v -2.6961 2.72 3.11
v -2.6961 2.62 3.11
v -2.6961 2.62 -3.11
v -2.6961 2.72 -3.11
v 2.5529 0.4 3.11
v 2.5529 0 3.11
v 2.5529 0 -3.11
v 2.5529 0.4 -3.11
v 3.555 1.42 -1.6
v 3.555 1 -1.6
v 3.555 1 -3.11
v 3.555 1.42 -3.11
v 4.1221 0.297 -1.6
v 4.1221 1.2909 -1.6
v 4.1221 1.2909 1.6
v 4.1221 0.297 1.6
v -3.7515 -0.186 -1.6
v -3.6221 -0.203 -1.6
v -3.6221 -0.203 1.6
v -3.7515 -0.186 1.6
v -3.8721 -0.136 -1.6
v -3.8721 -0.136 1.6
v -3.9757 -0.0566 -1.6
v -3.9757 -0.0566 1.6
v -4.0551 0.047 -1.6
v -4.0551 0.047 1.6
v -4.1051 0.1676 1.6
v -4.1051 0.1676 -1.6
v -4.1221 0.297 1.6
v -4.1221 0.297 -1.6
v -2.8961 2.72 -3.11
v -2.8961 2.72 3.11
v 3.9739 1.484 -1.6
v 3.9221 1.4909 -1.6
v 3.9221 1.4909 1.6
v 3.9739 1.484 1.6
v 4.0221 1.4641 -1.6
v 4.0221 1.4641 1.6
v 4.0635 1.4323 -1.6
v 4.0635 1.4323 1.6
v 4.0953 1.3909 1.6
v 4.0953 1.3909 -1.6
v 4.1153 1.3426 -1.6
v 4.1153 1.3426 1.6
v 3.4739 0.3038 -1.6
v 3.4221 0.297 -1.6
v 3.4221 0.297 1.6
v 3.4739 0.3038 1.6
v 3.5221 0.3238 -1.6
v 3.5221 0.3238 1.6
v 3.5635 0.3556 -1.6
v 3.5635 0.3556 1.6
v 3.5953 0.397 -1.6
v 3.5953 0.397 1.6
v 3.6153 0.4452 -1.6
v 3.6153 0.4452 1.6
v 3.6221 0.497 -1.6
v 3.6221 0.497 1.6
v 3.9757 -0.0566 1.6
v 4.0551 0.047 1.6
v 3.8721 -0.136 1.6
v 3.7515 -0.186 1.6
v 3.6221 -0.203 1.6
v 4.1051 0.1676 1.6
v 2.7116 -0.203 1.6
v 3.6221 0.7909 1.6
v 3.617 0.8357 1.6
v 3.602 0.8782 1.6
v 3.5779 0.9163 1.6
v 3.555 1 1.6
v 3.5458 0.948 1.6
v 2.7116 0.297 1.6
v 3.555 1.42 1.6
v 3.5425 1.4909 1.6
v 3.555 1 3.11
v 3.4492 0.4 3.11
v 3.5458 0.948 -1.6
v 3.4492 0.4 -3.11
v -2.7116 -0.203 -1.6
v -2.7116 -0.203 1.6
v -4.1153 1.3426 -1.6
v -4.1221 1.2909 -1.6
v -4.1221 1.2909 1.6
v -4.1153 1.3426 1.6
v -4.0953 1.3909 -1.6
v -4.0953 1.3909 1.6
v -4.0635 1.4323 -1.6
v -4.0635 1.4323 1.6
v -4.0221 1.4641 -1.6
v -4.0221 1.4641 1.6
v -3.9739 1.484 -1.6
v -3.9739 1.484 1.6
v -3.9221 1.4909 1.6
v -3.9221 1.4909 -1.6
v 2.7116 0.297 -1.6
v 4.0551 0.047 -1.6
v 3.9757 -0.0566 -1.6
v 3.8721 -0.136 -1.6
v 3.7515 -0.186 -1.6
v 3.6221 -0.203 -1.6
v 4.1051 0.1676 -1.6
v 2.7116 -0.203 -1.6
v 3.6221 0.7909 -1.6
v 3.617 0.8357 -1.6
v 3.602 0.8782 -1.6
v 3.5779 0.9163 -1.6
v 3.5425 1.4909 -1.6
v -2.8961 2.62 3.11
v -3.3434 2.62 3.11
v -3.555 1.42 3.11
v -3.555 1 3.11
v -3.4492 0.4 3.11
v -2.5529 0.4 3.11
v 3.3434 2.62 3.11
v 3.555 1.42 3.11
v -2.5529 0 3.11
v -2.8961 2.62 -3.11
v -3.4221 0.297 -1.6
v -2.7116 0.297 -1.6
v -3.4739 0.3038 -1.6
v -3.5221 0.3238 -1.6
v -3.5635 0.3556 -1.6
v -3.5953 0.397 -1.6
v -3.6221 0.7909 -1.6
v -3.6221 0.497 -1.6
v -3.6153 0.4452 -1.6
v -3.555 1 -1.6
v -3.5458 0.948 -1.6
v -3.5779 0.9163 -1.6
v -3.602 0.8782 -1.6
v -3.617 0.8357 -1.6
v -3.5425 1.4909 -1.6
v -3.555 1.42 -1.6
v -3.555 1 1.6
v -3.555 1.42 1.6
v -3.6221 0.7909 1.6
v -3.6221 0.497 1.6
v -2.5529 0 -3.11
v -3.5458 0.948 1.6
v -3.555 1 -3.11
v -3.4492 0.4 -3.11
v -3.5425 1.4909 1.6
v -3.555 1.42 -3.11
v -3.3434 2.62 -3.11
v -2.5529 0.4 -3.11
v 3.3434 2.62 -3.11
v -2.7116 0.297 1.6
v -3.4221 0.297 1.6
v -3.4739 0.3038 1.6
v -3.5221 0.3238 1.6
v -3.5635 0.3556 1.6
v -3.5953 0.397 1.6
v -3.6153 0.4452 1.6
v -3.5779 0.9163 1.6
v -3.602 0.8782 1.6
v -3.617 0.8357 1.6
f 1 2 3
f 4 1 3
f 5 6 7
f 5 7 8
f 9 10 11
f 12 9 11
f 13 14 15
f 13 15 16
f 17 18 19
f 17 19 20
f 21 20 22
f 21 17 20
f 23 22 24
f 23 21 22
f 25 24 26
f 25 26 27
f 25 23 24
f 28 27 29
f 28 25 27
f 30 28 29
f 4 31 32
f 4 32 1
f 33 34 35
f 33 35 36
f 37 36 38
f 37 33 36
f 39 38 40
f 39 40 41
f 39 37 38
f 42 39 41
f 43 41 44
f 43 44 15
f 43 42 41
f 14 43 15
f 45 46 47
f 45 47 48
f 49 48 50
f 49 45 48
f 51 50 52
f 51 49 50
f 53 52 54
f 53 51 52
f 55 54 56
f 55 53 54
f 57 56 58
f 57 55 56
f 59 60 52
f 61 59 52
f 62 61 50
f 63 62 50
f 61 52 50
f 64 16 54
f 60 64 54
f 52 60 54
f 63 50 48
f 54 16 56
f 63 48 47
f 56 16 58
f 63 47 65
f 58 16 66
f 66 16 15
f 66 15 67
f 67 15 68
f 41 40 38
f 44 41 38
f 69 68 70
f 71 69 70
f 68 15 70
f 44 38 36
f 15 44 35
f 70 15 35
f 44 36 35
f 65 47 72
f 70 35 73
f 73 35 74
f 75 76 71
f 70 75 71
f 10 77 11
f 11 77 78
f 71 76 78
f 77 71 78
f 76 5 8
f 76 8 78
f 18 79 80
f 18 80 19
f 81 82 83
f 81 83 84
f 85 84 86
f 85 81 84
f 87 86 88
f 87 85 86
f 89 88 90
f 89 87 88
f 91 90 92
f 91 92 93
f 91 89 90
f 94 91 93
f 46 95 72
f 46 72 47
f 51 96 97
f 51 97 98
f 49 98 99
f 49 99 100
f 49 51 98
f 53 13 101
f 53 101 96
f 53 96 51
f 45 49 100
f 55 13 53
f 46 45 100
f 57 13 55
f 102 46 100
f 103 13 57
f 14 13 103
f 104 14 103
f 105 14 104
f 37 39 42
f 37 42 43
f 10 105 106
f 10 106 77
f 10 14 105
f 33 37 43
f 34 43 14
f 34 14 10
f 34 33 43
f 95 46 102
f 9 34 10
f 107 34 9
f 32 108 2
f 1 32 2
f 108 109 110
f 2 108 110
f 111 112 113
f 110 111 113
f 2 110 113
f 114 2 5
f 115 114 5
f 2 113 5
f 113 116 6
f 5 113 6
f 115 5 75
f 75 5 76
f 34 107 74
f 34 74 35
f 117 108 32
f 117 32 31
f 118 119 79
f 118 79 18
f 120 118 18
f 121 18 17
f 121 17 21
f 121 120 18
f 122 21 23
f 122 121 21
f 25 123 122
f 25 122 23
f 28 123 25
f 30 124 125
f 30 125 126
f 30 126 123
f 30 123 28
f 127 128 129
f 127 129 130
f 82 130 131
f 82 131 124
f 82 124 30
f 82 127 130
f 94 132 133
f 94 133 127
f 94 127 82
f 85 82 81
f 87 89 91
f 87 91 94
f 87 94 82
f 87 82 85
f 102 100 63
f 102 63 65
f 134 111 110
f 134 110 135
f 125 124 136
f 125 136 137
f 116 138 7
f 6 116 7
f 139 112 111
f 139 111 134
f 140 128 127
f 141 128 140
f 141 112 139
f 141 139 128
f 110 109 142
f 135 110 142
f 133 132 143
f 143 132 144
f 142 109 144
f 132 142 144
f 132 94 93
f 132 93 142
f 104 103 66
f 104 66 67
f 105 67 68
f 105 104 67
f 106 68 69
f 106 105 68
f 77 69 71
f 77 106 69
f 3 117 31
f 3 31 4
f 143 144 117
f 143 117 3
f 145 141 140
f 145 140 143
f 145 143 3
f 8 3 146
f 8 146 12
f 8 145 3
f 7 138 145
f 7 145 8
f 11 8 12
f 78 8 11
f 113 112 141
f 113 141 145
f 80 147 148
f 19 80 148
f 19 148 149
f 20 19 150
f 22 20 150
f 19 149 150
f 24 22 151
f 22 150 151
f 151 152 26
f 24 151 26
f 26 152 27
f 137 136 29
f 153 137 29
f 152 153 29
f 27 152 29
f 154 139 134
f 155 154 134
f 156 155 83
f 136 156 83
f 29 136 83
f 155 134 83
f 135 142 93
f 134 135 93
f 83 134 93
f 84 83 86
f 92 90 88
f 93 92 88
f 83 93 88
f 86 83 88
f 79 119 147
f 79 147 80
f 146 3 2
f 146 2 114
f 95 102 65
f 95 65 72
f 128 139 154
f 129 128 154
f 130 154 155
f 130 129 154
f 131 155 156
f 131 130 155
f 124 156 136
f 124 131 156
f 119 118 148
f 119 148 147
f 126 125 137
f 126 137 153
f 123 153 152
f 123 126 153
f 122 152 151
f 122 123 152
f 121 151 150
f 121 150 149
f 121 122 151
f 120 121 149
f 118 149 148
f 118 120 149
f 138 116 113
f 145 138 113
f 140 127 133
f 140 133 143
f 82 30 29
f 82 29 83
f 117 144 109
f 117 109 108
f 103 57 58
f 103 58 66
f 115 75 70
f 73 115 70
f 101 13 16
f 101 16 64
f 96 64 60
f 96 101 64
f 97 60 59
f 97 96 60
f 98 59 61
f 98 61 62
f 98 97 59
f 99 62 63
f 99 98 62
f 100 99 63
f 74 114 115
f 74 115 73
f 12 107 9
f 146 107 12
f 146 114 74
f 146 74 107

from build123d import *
from OCP.BRepFilletAPI import BRepFilletAPI_MakeChamfer

# Parameters (mm, degrees)
SKETCH_1_W           = 7.11
SKETCH_1_H           = 6.22
EXTRUDE_1_DEPTH      = 2.62
CHAMFER_1_SIZE       = 1.2
CHAMFER_1_SIZE2      = 0.211592377
CHAMFER_2_SIZE       = 1
CHAMFER_2_SIZE2      = 0.176326981
SKETCH_3_W           = 1.589547356
SKETCH_3_H           = 0.4
CUT_EXTRUDE_1_DEPTH  = 8.628291093
EXTRUDE_2_DEPTH      = 1.6
EXTRUDE_2_DEPTH_BACK = 1.6
SKETCH_4_W           = 0.2
SKETCH_4_H           = 6.22
EXTRUDE_3_DEPTH      = 0.1


with BuildPart() as part:
    # 草图1 → 凸台-拉伸1 (new body)
    with BuildSketch(Plane(origin=(0, 0, 0), x_dir=(1, 0, 0), z_dir=(0, 1, 0))):
        Rectangle(SKETCH_1_W, SKETCH_1_H)
    extrude(amount=EXTRUDE_1_DEPTH)

    # 倒角1: one chamfer whose edges measure the first distance from different faces: ONE call of the kernel's chamfer builder (chamfer() names one face for all edges)
    chamfer_1_edges_1 = [part.edges().sort_by_distance(p)[0] for p in [
        (3.555, 2.62, 0),
    ]]
    chamfer_1_side_1 = [part.faces().sort_by_distance(p)[0] for p in [
        (3.555, 1.31, 0),
    ]]
    chamfer_1_edges_2 = [part.edges().sort_by_distance(p)[0] for p in [
        (-3.555, 2.62, 0),
    ]]
    chamfer_1_side_2 = [part.faces().sort_by_distance(p)[0] for p in [
        (-3.555, 1.31, 0),
    ]]
    chamfer_1 = BRepFilletAPI_MakeChamfer(part.part.solid().wrapped)
    for e in chamfer_1_edges_1:
        chamfer_1.Add(CHAMFER_1_SIZE, CHAMFER_1_SIZE2, e.wrapped, chamfer_1_side_1[0].wrapped)  # the first distance lies on this face
    for e in chamfer_1_edges_2:
        chamfer_1.Add(CHAMFER_1_SIZE, CHAMFER_1_SIZE2, e.wrapped, chamfer_1_side_2[0].wrapped)  # the first distance lies on this face
    add(Compound.cast(chamfer_1.Shape()), mode=Mode.REPLACE)

    # 倒角2: one chamfer whose edges measure the first distance from different faces: ONE call of the kernel's chamfer builder (chamfer() names one face for all edges)
    chamfer_2_edges_1 = [part.edges().sort_by_distance(p)[0] for p in [
        (3.555, 0, 0),
    ]]
    chamfer_2_side_1 = [part.faces().sort_by_distance(p)[0] for p in [
        (3.555, 0.71, 0),
    ]]
    chamfer_2_edges_2 = [part.edges().sort_by_distance(p)[0] for p in [
        (-3.555, 0, 0),
    ]]
    chamfer_2_side_2 = [part.faces().sort_by_distance(p)[0] for p in [
        (-3.555, 0.71, 0),
    ]]
    chamfer_2 = BRepFilletAPI_MakeChamfer(part.part.solid().wrapped)
    for e in chamfer_2_edges_1:
        chamfer_2.Add(CHAMFER_2_SIZE, CHAMFER_2_SIZE2, e.wrapped, chamfer_2_side_1[0].wrapped)  # the first distance lies on this face
    for e in chamfer_2_edges_2:
        chamfer_2.Add(CHAMFER_2_SIZE, CHAMFER_2_SIZE2, e.wrapped, chamfer_2_side_2[0].wrapped)  # the first distance lies on this face
    add(Compound.cast(chamfer_2.Shape()), mode=Mode.REPLACE)

    # 草图3 → 切除-拉伸1 (cut, through all)
    with BuildSketch(Plane.XY.offset(3.11)):
        with Locations((-3.34769153, 0.2)):
            Rectangle(SKETCH_3_W, SKETCH_3_H)
        with Locations((3.34769153, 0.2)):
            Rectangle(SKETCH_3_W, SKETCH_3_H)
    extrude(amount=-CUT_EXTRUDE_1_DEPTH, mode=Mode.SUBTRACT)

    # 草图2 → 凸台-拉伸2 (add, two sides: drawn at the far end of the back side and taken through both)
    with BuildSketch(Plane.XY.offset(-EXTRUDE_2_DEPTH_BACK)):
        with BuildLine():
            Line((3.311187824, 0.990859164), (3.311187824, 1.490859164))
            Line((3.311187824, 1.490859164), (3.922104584, 1.490859164))
            ThreePointArc((3.922104584, 1.490859164), (4.063525941, 1.43228052), (4.122104584, 1.290859164))
            Line((4.122104584, 1.290859164), (4.122104584, 0.297))
            ThreePointArc((4.122104584, 0.297), (3.975657975, -0.056553391), (3.622104584, -0.203))
            Line((3.622104584, -0.203), (2.711617897, -0.203))
            Line((2.711617897, -0.203), (2.711617897, 0.297))
            Line((2.711617897, 0.297), (3.422104584, 0.297))
            ThreePointArc((3.422104584, 0.297), (3.563525941, 0.355578644), (3.622104584, 0.497))
            Line((3.622104584, 0.497), (3.622104584, 0.790859164))
            ThreePointArc((3.622104584, 0.790859164), (3.563525941, 0.93228052), (3.422104584, 0.990859164))
            Line((3.422104584, 0.990859164), (3.311187824, 0.990859164))
        make_face()
        with BuildLine():
            Line((-3.311187824, 0.990859164), (-3.422104584, 0.990859164))
            ThreePointArc((-3.422104584, 0.990859164), (-3.563525941, 0.93228052), (-3.622104584, 0.790859164))
            Line((-3.622104584, 0.790859164), (-3.622104584, 0.497))
            ThreePointArc((-3.622104584, 0.497), (-3.563525941, 0.355578644), (-3.422104584, 0.297))
            Line((-3.422104584, 0.297), (-2.711617897, 0.297))
            Line((-2.711617897, 0.297), (-2.711617897, -0.203))
            Line((-2.711617897, -0.203), (-3.622104584, -0.203))
            ThreePointArc((-3.622104584, -0.203), (-3.975657975, -0.056553391), (-4.122104584, 0.297))
            Line((-4.122104584, 0.297), (-4.122104584, 1.290859164))
            ThreePointArc((-4.122104584, 1.290859164), (-4.063525941, 1.43228052), (-3.922104584, 1.490859164))
            Line((-3.922104584, 1.490859164), (-3.311187824, 1.490859164))
            Line((-3.311187824, 1.490859164), (-3.311187824, 0.990859164))
        make_face()
    extrude(amount=EXTRUDE_2_DEPTH + EXTRUDE_2_DEPTH_BACK)

    # 草图4 → 凸台-拉伸3 (add)
    with BuildSketch(Plane(origin=(0, 2.62, 0), x_dir=(1, 0, 0), z_dir=(0, 1, 0))):
        with Locations((-2.796130455, 0)):
            Rectangle(SKETCH_4_W, SKETCH_4_H)
    extrude(amount=EXTRUDE_3_DEPTH)


solid = part.part
